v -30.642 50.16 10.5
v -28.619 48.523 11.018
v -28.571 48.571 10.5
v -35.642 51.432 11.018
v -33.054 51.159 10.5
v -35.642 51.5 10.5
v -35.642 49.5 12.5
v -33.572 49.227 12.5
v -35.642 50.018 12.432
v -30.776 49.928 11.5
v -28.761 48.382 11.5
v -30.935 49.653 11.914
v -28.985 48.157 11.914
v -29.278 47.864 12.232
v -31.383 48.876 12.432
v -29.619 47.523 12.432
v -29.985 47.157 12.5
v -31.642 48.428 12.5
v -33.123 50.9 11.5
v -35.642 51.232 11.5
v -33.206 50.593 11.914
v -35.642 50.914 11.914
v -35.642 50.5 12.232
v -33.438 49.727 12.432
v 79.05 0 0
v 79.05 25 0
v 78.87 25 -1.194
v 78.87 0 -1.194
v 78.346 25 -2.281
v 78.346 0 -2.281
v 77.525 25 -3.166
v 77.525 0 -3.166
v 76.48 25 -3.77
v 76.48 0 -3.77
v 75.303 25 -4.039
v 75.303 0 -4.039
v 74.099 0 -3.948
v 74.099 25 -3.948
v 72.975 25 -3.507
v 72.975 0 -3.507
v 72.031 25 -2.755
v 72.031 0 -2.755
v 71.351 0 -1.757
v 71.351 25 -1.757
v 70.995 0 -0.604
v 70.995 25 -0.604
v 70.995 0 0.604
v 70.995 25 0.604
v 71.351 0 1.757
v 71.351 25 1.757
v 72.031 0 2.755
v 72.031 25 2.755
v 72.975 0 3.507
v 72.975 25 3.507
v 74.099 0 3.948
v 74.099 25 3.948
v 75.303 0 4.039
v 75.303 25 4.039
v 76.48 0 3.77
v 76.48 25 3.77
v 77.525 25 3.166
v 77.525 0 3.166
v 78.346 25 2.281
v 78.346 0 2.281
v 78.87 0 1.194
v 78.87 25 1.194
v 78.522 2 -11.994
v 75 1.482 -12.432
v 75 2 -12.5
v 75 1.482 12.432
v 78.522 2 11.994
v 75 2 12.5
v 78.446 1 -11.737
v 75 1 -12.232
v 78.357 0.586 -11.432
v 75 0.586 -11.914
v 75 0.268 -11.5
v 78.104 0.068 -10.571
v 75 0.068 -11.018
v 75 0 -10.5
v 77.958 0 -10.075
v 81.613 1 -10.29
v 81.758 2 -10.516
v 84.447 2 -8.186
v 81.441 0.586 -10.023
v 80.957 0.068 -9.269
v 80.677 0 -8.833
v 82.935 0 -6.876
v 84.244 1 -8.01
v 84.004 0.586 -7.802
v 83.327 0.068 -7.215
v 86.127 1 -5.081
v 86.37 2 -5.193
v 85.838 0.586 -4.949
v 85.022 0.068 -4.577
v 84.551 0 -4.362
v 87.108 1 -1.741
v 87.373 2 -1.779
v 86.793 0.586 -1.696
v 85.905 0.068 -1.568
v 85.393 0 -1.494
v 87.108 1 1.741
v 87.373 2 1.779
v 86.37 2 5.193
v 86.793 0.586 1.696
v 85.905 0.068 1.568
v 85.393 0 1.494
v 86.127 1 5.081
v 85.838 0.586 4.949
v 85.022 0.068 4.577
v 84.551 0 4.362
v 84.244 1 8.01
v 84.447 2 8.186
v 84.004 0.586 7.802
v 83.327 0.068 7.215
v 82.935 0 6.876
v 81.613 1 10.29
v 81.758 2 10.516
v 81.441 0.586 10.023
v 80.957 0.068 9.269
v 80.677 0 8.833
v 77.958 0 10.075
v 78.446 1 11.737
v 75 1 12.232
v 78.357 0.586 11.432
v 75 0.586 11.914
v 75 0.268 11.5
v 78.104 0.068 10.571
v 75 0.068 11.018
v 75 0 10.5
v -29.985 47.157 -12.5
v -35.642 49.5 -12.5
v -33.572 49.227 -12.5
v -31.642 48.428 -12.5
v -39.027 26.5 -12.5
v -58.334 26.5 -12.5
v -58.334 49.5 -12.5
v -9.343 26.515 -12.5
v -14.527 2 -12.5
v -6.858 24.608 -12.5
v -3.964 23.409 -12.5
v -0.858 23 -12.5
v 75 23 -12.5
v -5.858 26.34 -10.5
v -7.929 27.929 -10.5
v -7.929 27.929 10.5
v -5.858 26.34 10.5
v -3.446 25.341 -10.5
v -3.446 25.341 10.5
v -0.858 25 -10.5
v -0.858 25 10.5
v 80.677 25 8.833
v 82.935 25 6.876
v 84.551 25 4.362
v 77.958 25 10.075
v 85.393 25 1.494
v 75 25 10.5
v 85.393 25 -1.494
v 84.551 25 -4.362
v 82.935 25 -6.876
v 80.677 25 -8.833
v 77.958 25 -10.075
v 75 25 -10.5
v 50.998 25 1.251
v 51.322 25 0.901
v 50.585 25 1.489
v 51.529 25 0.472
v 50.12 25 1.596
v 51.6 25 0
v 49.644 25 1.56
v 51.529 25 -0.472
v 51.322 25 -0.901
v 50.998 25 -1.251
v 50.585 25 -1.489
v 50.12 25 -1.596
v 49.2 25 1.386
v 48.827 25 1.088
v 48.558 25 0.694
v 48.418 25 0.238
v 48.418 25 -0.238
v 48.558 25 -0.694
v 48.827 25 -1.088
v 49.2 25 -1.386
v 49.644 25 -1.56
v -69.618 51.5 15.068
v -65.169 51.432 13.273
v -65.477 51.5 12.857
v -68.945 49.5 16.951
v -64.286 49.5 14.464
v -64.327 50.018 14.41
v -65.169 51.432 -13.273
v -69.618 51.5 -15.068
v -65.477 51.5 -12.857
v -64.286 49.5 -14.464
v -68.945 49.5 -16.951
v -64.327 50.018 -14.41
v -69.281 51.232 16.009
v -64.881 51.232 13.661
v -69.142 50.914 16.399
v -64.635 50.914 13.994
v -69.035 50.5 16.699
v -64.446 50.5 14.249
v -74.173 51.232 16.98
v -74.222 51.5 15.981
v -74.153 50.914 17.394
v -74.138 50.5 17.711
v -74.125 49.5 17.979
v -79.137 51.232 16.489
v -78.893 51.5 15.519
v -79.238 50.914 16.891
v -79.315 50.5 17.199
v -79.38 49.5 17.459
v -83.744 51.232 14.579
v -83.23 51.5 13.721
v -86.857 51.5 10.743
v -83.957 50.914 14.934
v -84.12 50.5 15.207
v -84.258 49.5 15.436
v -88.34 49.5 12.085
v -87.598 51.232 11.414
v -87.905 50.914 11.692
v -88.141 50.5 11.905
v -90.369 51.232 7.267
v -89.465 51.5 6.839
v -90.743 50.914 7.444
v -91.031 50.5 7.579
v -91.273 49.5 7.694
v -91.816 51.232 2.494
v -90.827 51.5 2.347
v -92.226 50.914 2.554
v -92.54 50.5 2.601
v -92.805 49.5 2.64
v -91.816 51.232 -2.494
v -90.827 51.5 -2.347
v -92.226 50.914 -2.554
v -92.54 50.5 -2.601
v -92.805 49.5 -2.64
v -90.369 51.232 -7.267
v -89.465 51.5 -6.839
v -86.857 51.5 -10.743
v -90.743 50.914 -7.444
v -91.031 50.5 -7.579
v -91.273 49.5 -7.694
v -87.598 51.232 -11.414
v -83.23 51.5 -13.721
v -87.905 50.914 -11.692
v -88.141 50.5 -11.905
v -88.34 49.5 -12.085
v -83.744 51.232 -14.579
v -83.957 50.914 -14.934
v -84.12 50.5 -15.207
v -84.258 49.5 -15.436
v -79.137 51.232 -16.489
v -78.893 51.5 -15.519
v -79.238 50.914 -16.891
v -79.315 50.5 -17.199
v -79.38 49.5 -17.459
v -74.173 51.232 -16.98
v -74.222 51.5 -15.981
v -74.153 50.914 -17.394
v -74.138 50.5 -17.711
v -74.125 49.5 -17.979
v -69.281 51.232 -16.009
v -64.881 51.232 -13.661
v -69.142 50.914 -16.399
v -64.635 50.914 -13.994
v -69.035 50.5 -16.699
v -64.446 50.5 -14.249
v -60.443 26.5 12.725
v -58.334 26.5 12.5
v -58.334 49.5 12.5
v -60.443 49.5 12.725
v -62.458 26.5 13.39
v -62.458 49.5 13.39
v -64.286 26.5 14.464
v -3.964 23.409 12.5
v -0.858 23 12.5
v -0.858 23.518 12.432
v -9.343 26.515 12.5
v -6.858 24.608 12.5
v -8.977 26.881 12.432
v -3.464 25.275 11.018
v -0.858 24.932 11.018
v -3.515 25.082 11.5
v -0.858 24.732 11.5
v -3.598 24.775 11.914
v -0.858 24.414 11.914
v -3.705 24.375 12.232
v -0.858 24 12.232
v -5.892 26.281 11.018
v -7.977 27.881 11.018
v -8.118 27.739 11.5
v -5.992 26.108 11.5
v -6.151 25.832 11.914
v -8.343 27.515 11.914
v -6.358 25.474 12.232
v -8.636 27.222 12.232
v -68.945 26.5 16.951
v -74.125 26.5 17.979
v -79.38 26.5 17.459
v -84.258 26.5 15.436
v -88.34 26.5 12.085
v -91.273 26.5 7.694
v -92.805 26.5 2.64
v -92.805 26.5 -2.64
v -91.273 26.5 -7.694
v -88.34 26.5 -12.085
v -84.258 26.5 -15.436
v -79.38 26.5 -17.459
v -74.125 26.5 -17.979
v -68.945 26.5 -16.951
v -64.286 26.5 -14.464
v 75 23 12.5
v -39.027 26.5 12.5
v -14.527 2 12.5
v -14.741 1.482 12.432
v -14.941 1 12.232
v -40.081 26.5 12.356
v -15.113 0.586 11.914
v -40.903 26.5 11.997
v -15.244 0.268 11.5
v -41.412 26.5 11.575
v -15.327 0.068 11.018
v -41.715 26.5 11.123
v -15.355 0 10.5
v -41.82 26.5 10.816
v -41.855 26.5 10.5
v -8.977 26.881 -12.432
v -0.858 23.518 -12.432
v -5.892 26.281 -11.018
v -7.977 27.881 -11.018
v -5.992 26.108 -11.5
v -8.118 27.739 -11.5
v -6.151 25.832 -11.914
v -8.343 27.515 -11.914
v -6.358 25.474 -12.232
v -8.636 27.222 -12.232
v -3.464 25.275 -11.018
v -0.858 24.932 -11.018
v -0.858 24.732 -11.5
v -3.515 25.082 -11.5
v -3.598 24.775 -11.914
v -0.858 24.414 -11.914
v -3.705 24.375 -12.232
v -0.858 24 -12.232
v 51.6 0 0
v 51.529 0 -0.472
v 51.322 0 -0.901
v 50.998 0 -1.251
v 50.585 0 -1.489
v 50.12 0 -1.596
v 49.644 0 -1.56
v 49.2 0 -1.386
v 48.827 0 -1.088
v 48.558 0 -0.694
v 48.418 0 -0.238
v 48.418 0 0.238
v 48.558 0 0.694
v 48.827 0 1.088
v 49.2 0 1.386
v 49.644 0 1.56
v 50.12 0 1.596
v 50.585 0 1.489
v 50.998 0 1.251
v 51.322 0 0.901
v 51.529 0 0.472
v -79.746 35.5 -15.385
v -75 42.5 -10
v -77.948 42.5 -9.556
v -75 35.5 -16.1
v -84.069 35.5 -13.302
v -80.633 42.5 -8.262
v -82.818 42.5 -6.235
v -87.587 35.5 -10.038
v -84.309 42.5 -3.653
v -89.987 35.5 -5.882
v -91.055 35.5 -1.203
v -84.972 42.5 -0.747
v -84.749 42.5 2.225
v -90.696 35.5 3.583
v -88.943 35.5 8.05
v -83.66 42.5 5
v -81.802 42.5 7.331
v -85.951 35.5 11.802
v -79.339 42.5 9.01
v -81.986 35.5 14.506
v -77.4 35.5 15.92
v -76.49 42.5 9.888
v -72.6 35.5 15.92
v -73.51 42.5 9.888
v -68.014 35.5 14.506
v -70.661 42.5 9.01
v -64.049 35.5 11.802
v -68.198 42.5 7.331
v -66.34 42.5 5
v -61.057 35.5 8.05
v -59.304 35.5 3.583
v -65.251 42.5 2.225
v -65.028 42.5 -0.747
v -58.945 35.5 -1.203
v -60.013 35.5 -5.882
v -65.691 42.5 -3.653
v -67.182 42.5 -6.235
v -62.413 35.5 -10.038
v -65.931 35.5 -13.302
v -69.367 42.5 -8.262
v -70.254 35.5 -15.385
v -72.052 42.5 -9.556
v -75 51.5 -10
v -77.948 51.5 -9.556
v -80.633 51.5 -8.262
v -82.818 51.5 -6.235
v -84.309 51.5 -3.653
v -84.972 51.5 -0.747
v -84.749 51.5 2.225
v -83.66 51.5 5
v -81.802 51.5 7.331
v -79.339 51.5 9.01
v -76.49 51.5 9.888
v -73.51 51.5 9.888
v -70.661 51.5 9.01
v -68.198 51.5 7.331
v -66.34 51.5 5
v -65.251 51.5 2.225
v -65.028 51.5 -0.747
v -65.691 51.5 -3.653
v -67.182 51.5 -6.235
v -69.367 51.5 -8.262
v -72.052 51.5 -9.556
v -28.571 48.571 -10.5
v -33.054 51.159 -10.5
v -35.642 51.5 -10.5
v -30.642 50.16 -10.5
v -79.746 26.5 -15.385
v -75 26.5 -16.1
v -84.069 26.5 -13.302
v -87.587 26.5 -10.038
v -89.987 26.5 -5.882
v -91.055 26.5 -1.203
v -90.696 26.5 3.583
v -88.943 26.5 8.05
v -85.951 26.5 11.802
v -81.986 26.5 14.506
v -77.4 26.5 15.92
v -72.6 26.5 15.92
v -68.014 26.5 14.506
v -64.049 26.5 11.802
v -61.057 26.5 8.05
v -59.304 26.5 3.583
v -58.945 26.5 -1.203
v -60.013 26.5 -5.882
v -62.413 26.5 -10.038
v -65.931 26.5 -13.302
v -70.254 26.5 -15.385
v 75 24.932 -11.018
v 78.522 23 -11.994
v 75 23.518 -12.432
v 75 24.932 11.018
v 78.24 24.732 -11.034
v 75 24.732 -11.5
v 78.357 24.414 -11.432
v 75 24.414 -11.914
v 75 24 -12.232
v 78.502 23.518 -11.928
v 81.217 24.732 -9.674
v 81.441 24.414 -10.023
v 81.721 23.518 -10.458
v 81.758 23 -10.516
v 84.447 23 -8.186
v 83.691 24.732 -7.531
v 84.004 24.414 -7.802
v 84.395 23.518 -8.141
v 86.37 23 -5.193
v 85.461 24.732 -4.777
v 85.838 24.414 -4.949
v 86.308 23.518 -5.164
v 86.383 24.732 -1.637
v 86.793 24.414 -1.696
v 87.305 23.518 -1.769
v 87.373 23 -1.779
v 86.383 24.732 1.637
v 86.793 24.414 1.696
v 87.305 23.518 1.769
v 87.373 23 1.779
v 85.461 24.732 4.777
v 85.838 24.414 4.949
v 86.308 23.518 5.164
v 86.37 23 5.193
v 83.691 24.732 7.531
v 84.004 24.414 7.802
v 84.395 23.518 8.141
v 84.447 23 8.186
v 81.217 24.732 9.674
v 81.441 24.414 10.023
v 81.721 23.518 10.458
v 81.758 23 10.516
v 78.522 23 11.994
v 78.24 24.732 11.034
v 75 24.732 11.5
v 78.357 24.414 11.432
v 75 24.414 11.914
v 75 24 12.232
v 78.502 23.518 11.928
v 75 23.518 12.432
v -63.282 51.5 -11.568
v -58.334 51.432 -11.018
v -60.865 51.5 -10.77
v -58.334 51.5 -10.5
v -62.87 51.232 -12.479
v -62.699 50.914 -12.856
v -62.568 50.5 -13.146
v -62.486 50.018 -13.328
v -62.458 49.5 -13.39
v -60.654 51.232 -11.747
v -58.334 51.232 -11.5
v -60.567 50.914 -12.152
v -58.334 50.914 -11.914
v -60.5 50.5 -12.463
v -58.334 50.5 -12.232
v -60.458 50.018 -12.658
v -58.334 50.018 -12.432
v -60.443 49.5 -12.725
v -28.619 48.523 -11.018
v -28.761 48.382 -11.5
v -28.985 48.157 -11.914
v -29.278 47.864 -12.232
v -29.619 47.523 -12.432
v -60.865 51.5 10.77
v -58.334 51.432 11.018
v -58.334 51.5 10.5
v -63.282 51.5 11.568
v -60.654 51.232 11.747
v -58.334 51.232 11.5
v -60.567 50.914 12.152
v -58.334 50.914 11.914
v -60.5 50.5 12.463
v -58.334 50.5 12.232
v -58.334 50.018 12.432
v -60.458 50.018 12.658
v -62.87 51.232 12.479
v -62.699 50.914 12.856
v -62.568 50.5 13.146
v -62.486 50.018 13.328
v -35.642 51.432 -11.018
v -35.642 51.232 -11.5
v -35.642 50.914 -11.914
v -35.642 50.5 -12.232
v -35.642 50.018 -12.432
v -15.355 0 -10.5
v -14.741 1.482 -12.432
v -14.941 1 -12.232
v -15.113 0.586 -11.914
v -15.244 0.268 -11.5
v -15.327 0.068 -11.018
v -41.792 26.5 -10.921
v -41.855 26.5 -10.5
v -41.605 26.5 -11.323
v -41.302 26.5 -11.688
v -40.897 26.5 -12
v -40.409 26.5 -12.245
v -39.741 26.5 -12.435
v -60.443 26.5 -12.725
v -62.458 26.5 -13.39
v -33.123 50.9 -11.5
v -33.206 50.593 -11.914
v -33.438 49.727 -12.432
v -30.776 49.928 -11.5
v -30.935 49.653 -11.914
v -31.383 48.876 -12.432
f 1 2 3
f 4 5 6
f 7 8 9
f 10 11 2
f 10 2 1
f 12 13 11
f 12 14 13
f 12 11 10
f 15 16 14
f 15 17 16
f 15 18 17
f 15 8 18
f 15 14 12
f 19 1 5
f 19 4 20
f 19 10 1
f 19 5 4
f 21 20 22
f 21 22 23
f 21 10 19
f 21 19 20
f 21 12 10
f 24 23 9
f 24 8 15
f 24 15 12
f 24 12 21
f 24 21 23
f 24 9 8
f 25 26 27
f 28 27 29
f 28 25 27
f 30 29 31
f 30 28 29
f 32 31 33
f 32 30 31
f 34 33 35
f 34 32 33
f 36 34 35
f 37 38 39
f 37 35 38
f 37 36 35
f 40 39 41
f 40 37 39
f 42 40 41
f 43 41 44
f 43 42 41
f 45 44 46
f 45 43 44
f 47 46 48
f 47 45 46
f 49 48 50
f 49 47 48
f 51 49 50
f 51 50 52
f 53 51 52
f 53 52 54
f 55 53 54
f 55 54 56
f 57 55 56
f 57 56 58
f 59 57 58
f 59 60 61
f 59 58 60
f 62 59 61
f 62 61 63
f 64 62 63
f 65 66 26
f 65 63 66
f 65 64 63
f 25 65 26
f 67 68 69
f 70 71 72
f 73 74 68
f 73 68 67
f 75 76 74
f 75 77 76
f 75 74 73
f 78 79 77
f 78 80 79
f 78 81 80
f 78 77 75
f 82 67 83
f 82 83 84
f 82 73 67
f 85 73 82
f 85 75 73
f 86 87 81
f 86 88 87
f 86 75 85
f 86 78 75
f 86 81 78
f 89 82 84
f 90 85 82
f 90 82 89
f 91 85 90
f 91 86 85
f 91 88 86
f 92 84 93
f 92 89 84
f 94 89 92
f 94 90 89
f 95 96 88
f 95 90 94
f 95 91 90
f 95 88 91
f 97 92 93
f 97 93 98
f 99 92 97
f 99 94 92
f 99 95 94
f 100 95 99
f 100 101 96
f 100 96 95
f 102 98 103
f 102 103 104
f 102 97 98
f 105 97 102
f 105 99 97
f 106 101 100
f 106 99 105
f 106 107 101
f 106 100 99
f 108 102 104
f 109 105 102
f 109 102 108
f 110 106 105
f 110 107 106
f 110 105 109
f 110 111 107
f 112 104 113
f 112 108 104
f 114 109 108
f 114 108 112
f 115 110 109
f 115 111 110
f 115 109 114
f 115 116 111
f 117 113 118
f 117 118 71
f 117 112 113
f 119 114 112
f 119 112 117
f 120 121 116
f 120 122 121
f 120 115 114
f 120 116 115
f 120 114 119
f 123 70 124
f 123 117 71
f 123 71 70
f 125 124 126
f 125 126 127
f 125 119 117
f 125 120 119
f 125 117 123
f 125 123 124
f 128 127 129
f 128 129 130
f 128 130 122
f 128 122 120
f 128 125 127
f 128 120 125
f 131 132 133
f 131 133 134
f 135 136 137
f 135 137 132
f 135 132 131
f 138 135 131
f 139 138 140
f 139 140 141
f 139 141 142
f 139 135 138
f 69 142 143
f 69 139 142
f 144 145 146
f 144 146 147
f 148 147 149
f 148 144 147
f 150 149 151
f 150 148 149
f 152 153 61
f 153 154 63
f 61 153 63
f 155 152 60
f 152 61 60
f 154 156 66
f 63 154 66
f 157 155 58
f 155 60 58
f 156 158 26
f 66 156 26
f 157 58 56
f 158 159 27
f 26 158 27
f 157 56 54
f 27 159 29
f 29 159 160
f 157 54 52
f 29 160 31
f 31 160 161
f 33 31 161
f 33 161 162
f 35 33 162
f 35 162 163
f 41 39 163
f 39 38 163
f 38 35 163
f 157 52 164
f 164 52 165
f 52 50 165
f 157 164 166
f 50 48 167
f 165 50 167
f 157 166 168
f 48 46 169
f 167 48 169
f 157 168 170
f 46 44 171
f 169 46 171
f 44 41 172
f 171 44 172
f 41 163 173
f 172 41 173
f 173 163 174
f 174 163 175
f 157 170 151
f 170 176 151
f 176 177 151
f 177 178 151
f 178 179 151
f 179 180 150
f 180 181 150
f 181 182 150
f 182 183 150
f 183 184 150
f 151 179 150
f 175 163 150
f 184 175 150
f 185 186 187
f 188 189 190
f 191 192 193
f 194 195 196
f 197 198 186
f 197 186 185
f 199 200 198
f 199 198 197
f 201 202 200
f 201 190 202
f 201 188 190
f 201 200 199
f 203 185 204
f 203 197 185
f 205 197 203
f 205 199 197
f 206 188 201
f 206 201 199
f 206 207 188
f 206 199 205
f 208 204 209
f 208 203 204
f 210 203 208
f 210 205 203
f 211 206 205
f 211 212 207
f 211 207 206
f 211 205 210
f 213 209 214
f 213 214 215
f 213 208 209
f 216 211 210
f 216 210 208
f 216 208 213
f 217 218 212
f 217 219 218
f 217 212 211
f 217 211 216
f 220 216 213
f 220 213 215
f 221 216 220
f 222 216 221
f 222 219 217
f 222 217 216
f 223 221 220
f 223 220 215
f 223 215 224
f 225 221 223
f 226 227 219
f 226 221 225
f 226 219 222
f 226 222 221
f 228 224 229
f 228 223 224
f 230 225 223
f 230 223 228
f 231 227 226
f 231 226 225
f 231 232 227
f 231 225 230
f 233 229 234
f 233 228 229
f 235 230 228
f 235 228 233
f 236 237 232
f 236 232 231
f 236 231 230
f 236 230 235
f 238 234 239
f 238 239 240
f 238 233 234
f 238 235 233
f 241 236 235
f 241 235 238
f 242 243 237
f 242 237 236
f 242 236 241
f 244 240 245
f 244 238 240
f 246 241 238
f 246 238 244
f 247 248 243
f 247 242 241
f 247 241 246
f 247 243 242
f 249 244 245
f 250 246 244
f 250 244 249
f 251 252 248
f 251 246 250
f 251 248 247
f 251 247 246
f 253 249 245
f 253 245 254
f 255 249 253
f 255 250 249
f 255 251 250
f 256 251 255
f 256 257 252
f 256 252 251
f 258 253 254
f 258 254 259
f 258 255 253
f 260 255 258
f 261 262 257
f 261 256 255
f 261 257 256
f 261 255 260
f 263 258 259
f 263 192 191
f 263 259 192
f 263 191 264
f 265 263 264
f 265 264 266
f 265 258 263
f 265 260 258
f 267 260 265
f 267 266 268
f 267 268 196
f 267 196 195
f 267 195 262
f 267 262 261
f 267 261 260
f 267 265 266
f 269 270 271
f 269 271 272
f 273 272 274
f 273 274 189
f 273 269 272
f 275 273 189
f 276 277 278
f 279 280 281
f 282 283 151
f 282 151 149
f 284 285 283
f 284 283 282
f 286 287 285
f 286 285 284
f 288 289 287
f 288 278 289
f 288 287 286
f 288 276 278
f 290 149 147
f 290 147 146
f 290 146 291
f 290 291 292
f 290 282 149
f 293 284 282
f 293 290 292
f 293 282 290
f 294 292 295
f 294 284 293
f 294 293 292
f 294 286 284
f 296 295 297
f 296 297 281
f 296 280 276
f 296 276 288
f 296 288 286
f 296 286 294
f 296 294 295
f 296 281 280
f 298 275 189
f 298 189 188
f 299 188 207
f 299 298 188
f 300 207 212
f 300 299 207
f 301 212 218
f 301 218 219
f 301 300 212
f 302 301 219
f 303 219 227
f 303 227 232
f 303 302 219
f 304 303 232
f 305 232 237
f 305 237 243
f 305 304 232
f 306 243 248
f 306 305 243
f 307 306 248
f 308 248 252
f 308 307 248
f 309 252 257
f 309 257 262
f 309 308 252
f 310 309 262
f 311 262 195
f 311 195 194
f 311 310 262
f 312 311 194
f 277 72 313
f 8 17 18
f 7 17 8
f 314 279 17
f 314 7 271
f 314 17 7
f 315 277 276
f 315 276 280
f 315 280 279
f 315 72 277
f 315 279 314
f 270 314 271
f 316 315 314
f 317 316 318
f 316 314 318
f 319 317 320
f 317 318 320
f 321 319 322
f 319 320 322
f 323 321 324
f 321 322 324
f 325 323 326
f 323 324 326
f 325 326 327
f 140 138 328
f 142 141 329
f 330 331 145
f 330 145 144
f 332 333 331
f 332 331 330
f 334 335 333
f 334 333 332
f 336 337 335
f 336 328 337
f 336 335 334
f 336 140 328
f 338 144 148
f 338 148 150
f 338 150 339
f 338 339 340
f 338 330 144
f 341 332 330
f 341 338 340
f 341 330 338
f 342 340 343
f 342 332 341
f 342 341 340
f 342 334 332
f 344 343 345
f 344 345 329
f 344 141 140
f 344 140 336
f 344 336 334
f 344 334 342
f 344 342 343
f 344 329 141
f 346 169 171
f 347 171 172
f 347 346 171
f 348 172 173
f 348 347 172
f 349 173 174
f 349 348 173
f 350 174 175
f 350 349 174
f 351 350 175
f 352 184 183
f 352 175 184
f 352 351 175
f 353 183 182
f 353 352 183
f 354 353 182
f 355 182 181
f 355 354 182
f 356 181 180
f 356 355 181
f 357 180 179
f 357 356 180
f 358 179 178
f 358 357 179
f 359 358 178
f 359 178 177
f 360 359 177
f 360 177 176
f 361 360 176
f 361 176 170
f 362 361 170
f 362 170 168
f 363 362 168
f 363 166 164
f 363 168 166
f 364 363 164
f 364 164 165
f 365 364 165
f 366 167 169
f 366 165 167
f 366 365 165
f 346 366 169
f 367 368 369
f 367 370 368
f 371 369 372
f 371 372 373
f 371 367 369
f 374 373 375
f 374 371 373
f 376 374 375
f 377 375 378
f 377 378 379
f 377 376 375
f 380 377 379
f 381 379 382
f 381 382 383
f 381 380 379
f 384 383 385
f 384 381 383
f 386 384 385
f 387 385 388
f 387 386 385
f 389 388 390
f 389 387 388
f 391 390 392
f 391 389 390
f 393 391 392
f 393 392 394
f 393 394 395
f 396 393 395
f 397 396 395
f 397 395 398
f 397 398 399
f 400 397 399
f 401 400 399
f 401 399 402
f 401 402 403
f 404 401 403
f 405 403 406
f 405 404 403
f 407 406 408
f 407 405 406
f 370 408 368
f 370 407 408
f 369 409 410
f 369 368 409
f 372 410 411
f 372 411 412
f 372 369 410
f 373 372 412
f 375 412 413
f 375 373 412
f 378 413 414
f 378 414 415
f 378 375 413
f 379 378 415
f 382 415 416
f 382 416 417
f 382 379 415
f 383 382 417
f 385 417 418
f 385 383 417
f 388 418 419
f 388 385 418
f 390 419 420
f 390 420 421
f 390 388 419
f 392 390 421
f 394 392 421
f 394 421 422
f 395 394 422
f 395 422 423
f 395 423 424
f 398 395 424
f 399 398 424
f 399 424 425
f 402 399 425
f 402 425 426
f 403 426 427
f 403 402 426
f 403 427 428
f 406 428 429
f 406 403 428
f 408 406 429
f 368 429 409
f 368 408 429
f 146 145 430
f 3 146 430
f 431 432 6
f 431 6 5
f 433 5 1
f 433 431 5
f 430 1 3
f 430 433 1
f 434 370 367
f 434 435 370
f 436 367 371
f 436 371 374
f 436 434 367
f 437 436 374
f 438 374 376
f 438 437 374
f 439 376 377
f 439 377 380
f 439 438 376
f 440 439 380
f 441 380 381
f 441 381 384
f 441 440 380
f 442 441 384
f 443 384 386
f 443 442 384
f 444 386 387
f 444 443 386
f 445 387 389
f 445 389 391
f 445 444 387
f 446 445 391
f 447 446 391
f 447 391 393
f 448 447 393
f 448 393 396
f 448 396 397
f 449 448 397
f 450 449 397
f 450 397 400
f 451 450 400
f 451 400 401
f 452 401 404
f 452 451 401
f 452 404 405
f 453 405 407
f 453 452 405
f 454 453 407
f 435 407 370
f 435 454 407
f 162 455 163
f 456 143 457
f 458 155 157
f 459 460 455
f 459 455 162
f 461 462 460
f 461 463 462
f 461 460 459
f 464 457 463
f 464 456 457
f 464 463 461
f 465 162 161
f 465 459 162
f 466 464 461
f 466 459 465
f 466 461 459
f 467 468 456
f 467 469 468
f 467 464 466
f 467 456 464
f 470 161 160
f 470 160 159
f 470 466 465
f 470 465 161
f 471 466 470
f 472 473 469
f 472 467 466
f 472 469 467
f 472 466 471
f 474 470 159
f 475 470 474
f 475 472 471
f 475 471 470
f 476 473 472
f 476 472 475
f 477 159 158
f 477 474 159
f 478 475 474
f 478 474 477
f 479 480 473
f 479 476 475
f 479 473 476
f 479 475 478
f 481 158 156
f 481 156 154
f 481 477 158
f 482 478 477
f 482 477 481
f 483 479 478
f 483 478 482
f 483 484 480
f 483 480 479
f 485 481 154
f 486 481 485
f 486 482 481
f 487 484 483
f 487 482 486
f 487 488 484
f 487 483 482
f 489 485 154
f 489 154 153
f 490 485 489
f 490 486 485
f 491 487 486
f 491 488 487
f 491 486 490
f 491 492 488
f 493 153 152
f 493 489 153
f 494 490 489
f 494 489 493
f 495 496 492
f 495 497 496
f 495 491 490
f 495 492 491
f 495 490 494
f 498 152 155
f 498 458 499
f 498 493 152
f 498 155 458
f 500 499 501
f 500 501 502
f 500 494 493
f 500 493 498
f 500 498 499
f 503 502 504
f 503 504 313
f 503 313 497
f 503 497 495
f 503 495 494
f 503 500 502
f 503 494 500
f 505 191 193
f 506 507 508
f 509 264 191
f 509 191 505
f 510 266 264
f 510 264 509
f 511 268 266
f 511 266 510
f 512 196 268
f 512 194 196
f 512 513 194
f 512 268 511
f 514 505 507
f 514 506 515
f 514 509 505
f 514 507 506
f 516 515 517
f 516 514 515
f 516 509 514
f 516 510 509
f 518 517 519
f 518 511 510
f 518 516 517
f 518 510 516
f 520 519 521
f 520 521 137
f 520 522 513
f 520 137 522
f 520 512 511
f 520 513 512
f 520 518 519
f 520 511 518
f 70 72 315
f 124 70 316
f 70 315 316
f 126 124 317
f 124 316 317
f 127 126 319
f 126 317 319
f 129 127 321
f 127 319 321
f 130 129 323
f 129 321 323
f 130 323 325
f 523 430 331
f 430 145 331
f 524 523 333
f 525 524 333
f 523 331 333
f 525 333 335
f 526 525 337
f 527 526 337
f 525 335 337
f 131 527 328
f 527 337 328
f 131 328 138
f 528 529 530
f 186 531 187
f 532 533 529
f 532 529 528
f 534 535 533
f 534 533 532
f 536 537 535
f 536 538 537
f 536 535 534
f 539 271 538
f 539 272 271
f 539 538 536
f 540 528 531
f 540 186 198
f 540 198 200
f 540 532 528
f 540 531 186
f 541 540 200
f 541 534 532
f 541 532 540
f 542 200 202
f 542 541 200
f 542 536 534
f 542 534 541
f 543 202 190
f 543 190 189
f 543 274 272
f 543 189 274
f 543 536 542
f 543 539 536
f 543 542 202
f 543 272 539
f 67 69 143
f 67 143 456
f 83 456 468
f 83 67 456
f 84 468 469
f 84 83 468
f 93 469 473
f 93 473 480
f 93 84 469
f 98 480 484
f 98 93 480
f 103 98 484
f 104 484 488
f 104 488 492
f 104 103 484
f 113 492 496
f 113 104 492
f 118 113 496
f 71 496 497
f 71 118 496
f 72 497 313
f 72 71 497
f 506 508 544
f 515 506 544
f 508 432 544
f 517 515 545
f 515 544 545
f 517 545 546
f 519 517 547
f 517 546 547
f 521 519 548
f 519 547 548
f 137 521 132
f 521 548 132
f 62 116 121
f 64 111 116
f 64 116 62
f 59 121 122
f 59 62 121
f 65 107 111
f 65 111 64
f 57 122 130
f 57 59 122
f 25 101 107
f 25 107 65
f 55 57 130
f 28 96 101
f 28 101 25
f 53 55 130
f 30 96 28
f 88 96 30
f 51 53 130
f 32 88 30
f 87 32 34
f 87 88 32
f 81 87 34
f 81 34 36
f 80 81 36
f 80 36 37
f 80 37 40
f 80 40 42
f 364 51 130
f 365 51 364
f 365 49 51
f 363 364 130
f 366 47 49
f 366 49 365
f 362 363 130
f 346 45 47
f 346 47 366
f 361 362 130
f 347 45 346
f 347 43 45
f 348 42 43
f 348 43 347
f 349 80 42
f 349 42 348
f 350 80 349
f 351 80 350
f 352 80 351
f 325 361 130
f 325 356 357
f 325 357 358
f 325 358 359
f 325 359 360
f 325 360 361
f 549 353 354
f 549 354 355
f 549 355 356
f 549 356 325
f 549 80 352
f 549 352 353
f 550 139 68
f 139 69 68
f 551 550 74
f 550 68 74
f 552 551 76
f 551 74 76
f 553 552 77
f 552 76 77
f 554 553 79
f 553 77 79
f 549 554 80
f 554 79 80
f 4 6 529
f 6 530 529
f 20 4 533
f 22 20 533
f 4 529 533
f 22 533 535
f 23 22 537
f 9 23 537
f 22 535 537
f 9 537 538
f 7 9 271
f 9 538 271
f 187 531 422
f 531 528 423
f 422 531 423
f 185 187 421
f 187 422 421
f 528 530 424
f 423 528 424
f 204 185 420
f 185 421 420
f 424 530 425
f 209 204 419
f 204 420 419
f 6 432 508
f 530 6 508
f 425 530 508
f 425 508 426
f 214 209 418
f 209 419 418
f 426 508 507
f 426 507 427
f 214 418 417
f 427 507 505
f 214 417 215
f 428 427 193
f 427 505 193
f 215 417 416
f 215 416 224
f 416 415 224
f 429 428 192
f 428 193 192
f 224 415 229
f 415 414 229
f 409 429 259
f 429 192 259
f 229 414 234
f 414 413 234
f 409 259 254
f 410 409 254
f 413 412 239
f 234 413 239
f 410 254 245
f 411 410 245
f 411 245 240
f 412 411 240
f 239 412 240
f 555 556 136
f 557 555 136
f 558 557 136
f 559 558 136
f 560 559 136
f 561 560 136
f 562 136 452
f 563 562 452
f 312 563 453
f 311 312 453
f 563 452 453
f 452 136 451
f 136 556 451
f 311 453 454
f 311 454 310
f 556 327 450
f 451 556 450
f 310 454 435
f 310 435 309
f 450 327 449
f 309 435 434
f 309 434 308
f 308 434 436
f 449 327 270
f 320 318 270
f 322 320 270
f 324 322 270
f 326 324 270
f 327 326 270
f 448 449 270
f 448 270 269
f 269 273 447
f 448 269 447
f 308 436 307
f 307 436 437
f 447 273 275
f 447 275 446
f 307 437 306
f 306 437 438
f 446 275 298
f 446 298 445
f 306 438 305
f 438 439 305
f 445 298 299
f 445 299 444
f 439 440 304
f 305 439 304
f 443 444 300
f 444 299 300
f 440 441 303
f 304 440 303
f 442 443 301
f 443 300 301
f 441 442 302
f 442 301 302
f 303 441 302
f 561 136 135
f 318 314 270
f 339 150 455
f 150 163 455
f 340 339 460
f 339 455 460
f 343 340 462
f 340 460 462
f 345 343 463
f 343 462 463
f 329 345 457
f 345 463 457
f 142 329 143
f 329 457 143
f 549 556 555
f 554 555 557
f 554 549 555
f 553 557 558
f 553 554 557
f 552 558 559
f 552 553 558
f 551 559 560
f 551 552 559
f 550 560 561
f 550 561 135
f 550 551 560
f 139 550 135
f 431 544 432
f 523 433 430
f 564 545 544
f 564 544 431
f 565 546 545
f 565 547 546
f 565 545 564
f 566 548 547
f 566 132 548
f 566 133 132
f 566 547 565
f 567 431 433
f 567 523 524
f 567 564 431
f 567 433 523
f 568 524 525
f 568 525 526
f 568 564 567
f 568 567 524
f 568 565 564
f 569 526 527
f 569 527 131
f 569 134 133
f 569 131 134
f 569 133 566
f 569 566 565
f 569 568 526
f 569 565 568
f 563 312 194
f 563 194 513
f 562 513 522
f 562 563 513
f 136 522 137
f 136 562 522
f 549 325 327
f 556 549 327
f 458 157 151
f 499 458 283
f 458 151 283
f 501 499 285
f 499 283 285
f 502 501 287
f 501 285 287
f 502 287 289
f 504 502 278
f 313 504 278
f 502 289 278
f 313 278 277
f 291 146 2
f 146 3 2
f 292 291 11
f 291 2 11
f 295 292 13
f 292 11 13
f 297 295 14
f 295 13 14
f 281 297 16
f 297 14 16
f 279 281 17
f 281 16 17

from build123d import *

# Parameters (mm, degrees)
SALIENTE_EXTRUIR1_DEPTH = 51.5
CORTAR_EXTRUIR2_DEPTH   = 25.75
CROQUIS5_R              = 4.05
CROQUIS5_R_2            = 1.6
CORTAR_EXTRUIR3_DEPTH   = 108.820452605
REDONDEO1_R             = 10
REDONDEO2_R             = 2
REDONDEO3_R             = 2


with BuildPart() as part:
    # Croquis1 → Saliente-Extruir1 (new body)
    with BuildSketch(Plane(origin=(0, 0, 0), x_dir=(1, 0, 0), z_dir=(0, 1, 0))):
        with BuildLine():
            Line((75, -12.5), (-58.334166688, -12.5))
            ThreePointArc((-58.334166688, -12.5), (-61.46808254, -13.003760143), (-64.286250013, -14.464285714))
            ThreePointArc((-64.286250013, -14.464285714), (-93, 0), (-64.286250013, 14.464285714))
            ThreePointArc((-64.286250013, 14.464285714), (-61.46808254, 13.003760143), (-58.334166688, 12.5))
            Line((-58.334166688, 12.5), (75, 12.5))
            ThreePointArc((75, 12.5), (87.5, 0), (75, -12.5))
        make_face()
    extrude(amount=SALIENTE_EXTRUIR1_DEPTH)

    # Croquis3 → Cortar-Extruir2 (cut, symmetric)
    with BuildSketch(Plane.XY):
        Polygon((87.5, 25), (-5, 25), (-31.5, 51.5), (87.5, 51.5), align=None)
        Polygon((-15.355339059, 0), (-41.855339059, 26.5), (-93, 26.5), (-93, 0), align=None)
    extrude(amount=CORTAR_EXTRUIR2_DEPTH, both=True, mode=Mode.SUBTRACT)

    # Croquis4 → Cortar-Revolución1 (revolve, cut)
    with BuildSketch(Plane.XY):
        Polygon((-75, 26.5), (-75, 51.5), (-85, 51.5), (-85, 42.5), (-91.1, 35.5), (-91.1, 26.5), align=None)
    revolve(axis=Axis((-75, 26.5, 0), (0, 1, 0)), mode=Mode.SUBTRACT)

    # Croquis5 → Cortar-Extruir3 (cut, through all)
    with BuildSketch(Plane(origin=(0, 0, 0), x_dir=(1, 0, 0), z_dir=(0, 1, 0))):
        with Locations((75, 0)):
            Circle(CROQUIS5_R)
        with Locations((50, 0)):
            Circle(CROQUIS5_R_2)
    extrude(amount=CORTAR_EXTRUIR3_DEPTH, mode=Mode.SUBTRACT)

    # Redondeo1
    redondeo1_edges = [part.edges().sort_by_distance(p)[0] for p in [
        (-31.5, 51.5, 0),
        (-5, 25, 0),
    ]]
    fillet(redondeo1_edges, radius=REDONDEO1_R)

    # Redondeo2
    redondeo2_edges = [part.edges().sort_by_distance(p)[0] for p in [
        (-4.6846987, 25.761204675, -12.5),
        (-18.25, 38.25, -12.5),
        (-31.8153013, 50.738795325, -12.5),
        (-46.988151156, 51.5, -12.5),
        (-61.46808254, 51.5, -13.003760143),
        (-93, 51.5, 0),
        (-61.46808254, 51.5, 13.003760143),
        (-46.988151156, 51.5, 12.5),
        (-31.8153013, 50.738795325, 12.5),
        (-18.25, 38.25, 12.5),
        (-4.6846987, 25.761204675, 12.5),
        (37.071067812, 25, 12.5),
        (87.5, 25, 0),
        (37.071067812, 25, -12.5),
    ]]
    fillet(redondeo2_edges, radius=REDONDEO2_R)

    # Redondeo3
    redondeo3_edges = [part.edges().sort_by_distance(p)[0] for p in [
        (29.82233047, 0, 12.5),
        (87.5, 0, 0),
        (-28.605339059, 13.25, 12.5),
        (-28.605339059, 13.25, -12.5),
        (29.82233047, 0, -12.5),
    ]]
    fillet(redondeo3_edges, radius=REDONDEO3_R)


solid = part.part
